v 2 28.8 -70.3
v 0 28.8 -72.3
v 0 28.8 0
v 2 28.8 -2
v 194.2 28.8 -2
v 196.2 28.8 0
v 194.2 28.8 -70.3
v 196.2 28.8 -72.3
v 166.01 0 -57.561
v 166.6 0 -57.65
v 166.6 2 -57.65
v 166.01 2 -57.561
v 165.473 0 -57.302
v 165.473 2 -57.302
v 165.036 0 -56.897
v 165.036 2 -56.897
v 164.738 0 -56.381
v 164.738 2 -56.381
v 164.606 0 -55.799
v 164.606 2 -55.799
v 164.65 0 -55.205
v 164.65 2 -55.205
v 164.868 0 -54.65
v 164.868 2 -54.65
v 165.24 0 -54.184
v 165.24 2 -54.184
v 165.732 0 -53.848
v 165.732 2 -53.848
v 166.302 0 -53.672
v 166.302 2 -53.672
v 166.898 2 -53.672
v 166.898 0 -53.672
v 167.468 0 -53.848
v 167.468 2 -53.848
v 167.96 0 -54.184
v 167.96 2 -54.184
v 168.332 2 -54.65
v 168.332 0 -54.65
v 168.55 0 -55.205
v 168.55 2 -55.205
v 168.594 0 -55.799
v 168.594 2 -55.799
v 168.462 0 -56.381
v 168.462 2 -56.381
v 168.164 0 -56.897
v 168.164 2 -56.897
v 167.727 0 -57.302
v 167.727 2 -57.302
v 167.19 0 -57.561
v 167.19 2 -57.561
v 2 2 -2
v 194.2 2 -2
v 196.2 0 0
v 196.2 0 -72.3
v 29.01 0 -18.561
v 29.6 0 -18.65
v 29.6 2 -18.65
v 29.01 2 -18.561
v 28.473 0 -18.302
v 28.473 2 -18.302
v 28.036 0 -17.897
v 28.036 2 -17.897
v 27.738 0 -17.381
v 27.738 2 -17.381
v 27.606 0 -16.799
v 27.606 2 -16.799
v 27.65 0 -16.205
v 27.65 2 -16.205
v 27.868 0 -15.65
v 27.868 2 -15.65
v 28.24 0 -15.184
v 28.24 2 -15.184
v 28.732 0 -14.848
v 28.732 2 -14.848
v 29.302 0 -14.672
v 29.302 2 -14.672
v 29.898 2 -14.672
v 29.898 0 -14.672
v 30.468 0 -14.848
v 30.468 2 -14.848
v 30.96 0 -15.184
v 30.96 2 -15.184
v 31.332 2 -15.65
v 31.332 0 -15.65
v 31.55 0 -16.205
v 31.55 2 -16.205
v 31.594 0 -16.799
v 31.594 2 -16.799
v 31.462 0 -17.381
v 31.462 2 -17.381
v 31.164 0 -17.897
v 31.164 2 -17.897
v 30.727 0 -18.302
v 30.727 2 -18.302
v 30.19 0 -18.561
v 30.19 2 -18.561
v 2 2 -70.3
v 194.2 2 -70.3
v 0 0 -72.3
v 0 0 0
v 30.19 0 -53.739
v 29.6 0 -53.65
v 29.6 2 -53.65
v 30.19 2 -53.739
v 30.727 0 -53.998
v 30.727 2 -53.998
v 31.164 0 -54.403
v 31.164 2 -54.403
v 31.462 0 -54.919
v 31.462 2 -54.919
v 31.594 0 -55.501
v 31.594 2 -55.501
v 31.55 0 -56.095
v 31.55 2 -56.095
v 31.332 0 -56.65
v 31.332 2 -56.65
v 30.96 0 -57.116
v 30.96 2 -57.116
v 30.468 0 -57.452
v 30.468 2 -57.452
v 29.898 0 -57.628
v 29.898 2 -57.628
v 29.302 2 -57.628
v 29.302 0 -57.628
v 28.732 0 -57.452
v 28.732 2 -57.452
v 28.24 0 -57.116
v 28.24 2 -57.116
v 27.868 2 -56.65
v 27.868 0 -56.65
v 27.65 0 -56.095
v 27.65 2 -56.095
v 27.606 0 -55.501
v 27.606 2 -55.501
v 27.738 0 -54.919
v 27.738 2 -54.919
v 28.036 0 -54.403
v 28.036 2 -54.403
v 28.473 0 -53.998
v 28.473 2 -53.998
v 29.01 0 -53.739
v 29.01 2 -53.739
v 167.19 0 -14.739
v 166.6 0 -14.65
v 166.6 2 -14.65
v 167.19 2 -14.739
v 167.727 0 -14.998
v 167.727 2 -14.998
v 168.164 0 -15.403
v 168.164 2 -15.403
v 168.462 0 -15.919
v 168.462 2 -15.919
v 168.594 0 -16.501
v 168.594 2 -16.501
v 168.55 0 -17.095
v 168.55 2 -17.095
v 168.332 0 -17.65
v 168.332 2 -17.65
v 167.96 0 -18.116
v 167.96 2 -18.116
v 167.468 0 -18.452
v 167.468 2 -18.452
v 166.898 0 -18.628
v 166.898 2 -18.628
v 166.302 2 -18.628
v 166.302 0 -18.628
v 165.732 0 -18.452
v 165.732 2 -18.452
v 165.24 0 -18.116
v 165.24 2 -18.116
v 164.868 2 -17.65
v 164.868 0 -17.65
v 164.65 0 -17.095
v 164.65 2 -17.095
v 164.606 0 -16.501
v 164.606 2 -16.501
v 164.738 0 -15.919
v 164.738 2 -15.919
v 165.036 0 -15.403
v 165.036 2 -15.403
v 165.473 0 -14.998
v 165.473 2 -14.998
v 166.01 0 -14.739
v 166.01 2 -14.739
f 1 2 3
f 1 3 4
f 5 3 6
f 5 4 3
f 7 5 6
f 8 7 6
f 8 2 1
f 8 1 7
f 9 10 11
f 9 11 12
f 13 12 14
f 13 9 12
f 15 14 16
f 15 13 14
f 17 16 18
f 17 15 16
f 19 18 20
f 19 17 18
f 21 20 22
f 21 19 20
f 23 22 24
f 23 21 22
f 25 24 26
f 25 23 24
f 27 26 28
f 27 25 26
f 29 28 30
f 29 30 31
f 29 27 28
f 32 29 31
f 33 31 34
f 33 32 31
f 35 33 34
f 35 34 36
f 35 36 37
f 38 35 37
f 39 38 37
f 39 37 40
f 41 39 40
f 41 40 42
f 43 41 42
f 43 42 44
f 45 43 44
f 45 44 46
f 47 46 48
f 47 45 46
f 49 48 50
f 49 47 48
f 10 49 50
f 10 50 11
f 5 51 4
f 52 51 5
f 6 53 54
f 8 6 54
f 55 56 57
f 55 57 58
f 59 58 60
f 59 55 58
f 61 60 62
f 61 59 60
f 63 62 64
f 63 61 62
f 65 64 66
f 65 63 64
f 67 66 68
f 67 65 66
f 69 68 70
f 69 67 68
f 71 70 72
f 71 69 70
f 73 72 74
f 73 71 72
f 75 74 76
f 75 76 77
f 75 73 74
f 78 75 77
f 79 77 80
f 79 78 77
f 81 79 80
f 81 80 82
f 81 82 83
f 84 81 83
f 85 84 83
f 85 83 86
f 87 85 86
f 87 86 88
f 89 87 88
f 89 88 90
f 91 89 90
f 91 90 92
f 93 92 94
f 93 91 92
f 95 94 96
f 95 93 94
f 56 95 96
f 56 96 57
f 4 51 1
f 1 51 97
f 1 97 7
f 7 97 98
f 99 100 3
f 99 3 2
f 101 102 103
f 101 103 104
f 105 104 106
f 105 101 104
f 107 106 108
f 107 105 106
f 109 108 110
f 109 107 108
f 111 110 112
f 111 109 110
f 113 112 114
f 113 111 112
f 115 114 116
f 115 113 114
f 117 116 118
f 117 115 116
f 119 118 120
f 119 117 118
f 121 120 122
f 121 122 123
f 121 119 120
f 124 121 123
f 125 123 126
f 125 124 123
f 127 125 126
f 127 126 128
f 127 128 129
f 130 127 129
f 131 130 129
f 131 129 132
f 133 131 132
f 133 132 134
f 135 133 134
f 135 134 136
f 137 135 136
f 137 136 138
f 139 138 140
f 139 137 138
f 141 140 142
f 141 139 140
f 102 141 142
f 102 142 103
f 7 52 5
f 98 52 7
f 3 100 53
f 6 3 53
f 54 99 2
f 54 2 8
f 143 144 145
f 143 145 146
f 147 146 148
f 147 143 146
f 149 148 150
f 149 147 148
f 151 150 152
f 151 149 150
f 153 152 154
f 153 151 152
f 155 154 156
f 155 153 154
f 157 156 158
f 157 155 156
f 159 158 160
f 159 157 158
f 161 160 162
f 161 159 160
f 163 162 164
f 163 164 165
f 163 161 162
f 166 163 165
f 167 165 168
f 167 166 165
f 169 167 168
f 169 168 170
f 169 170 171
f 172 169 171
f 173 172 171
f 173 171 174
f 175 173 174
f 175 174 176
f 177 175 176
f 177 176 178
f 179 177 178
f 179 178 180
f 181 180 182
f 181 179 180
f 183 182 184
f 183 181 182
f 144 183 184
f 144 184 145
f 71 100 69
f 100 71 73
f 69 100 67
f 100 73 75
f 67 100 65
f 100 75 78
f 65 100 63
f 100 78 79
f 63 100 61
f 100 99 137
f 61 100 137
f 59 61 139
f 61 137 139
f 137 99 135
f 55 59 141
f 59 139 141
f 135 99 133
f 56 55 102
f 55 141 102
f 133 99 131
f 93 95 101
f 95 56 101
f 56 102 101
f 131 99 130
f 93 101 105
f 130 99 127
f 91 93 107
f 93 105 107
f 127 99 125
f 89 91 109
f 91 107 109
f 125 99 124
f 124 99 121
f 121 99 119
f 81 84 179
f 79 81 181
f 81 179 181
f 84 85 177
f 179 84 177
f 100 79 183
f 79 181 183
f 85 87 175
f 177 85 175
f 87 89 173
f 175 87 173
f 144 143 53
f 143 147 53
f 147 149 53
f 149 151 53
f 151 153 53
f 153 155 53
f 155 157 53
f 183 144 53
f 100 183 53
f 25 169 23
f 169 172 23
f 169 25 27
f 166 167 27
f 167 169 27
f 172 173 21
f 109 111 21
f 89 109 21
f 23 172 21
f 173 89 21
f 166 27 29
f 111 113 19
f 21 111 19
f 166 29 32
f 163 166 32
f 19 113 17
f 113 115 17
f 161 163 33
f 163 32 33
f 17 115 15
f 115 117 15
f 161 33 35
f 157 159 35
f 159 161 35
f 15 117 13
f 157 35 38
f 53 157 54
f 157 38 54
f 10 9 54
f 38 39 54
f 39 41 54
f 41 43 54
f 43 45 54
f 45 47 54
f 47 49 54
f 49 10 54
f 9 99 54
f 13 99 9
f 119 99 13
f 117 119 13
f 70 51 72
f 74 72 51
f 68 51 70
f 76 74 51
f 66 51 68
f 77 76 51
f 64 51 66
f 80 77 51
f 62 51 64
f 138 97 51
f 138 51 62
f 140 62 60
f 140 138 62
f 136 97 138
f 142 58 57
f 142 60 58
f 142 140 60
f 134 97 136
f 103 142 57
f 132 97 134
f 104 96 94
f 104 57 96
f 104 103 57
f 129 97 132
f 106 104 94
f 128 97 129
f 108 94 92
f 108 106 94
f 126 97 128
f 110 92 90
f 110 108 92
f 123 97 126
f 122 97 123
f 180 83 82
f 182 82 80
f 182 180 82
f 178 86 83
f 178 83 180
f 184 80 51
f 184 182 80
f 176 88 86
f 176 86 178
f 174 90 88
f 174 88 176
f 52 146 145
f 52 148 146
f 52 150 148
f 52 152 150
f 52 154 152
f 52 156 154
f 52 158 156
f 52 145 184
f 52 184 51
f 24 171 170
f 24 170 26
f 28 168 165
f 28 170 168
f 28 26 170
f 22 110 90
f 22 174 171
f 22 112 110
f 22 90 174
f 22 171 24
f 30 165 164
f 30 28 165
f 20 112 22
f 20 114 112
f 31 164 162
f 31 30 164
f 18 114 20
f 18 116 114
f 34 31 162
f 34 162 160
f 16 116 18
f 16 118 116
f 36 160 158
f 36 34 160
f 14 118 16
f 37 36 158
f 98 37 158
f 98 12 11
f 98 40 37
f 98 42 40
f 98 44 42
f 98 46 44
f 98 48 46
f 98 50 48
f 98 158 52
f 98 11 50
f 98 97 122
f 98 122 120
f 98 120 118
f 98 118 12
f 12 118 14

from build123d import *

# Parameters (mm, degrees)
ESQUISSE1_W        = 196.2
ESQUISSE1_H        = 72.3
ESQUISSE1_W_2      = 192.2
ESQUISSE1_H_2      = 68.3
BOSS_EXTRU_1_DEPTH = 28.8
ESQUISSE1_3_W      = 192.2
ESQUISSE1_3_H      = 68.3
ESQUISSE1_3_R      = 2
BOSS_EXTRU_2_DEPTH = 2


with BuildPart() as part:
    # Esquisse1 → Boss.-Extru.1 (new body)
    with BuildSketch(Plane(origin=(0, 0, 0), x_dir=(1, 0, 0), z_dir=(0, 1, 0))):
        with Locations((98.1, 36.15)):
            Rectangle(ESQUISSE1_W, ESQUISSE1_H)
        with Locations((98.1, 36.15)):
            Rectangle(ESQUISSE1_W_2, ESQUISSE1_H_2, mode=Mode.SUBTRACT)
    extrude(amount=BOSS_EXTRU_1_DEPTH)

    # Esquisse1<3> → Boss.-Extru.2 (add)
    with BuildSketch(Plane(origin=(0, 0, 0), x_dir=(1, 0, 0), z_dir=(0, 1, 0))):
        with Locations((98.1, 36.15)):
            Rectangle(ESQUISSE1_3_W, ESQUISSE1_3_H)
        with Locations(Location((29.6, 55.65, 0), (0, 0, 270))):
            Circle(ESQUISSE1_3_R, mode=Mode.SUBTRACT)
        with Locations(Location((29.6, 16.65, 0), (0, 0, 90))):
            Circle(ESQUISSE1_3_R, mode=Mode.SUBTRACT)
        with Locations(Location((166.6, 55.65, 0), (0, 0, 90))):
            Circle(ESQUISSE1_3_R, mode=Mode.SUBTRACT)
        with Locations(Location((166.6, 16.65, 0), (0, 0, 270))):
            Circle(ESQUISSE1_3_R, mode=Mode.SUBTRACT)
    extrude(amount=BOSS_EXTRU_2_DEPTH)


solid = part.part
